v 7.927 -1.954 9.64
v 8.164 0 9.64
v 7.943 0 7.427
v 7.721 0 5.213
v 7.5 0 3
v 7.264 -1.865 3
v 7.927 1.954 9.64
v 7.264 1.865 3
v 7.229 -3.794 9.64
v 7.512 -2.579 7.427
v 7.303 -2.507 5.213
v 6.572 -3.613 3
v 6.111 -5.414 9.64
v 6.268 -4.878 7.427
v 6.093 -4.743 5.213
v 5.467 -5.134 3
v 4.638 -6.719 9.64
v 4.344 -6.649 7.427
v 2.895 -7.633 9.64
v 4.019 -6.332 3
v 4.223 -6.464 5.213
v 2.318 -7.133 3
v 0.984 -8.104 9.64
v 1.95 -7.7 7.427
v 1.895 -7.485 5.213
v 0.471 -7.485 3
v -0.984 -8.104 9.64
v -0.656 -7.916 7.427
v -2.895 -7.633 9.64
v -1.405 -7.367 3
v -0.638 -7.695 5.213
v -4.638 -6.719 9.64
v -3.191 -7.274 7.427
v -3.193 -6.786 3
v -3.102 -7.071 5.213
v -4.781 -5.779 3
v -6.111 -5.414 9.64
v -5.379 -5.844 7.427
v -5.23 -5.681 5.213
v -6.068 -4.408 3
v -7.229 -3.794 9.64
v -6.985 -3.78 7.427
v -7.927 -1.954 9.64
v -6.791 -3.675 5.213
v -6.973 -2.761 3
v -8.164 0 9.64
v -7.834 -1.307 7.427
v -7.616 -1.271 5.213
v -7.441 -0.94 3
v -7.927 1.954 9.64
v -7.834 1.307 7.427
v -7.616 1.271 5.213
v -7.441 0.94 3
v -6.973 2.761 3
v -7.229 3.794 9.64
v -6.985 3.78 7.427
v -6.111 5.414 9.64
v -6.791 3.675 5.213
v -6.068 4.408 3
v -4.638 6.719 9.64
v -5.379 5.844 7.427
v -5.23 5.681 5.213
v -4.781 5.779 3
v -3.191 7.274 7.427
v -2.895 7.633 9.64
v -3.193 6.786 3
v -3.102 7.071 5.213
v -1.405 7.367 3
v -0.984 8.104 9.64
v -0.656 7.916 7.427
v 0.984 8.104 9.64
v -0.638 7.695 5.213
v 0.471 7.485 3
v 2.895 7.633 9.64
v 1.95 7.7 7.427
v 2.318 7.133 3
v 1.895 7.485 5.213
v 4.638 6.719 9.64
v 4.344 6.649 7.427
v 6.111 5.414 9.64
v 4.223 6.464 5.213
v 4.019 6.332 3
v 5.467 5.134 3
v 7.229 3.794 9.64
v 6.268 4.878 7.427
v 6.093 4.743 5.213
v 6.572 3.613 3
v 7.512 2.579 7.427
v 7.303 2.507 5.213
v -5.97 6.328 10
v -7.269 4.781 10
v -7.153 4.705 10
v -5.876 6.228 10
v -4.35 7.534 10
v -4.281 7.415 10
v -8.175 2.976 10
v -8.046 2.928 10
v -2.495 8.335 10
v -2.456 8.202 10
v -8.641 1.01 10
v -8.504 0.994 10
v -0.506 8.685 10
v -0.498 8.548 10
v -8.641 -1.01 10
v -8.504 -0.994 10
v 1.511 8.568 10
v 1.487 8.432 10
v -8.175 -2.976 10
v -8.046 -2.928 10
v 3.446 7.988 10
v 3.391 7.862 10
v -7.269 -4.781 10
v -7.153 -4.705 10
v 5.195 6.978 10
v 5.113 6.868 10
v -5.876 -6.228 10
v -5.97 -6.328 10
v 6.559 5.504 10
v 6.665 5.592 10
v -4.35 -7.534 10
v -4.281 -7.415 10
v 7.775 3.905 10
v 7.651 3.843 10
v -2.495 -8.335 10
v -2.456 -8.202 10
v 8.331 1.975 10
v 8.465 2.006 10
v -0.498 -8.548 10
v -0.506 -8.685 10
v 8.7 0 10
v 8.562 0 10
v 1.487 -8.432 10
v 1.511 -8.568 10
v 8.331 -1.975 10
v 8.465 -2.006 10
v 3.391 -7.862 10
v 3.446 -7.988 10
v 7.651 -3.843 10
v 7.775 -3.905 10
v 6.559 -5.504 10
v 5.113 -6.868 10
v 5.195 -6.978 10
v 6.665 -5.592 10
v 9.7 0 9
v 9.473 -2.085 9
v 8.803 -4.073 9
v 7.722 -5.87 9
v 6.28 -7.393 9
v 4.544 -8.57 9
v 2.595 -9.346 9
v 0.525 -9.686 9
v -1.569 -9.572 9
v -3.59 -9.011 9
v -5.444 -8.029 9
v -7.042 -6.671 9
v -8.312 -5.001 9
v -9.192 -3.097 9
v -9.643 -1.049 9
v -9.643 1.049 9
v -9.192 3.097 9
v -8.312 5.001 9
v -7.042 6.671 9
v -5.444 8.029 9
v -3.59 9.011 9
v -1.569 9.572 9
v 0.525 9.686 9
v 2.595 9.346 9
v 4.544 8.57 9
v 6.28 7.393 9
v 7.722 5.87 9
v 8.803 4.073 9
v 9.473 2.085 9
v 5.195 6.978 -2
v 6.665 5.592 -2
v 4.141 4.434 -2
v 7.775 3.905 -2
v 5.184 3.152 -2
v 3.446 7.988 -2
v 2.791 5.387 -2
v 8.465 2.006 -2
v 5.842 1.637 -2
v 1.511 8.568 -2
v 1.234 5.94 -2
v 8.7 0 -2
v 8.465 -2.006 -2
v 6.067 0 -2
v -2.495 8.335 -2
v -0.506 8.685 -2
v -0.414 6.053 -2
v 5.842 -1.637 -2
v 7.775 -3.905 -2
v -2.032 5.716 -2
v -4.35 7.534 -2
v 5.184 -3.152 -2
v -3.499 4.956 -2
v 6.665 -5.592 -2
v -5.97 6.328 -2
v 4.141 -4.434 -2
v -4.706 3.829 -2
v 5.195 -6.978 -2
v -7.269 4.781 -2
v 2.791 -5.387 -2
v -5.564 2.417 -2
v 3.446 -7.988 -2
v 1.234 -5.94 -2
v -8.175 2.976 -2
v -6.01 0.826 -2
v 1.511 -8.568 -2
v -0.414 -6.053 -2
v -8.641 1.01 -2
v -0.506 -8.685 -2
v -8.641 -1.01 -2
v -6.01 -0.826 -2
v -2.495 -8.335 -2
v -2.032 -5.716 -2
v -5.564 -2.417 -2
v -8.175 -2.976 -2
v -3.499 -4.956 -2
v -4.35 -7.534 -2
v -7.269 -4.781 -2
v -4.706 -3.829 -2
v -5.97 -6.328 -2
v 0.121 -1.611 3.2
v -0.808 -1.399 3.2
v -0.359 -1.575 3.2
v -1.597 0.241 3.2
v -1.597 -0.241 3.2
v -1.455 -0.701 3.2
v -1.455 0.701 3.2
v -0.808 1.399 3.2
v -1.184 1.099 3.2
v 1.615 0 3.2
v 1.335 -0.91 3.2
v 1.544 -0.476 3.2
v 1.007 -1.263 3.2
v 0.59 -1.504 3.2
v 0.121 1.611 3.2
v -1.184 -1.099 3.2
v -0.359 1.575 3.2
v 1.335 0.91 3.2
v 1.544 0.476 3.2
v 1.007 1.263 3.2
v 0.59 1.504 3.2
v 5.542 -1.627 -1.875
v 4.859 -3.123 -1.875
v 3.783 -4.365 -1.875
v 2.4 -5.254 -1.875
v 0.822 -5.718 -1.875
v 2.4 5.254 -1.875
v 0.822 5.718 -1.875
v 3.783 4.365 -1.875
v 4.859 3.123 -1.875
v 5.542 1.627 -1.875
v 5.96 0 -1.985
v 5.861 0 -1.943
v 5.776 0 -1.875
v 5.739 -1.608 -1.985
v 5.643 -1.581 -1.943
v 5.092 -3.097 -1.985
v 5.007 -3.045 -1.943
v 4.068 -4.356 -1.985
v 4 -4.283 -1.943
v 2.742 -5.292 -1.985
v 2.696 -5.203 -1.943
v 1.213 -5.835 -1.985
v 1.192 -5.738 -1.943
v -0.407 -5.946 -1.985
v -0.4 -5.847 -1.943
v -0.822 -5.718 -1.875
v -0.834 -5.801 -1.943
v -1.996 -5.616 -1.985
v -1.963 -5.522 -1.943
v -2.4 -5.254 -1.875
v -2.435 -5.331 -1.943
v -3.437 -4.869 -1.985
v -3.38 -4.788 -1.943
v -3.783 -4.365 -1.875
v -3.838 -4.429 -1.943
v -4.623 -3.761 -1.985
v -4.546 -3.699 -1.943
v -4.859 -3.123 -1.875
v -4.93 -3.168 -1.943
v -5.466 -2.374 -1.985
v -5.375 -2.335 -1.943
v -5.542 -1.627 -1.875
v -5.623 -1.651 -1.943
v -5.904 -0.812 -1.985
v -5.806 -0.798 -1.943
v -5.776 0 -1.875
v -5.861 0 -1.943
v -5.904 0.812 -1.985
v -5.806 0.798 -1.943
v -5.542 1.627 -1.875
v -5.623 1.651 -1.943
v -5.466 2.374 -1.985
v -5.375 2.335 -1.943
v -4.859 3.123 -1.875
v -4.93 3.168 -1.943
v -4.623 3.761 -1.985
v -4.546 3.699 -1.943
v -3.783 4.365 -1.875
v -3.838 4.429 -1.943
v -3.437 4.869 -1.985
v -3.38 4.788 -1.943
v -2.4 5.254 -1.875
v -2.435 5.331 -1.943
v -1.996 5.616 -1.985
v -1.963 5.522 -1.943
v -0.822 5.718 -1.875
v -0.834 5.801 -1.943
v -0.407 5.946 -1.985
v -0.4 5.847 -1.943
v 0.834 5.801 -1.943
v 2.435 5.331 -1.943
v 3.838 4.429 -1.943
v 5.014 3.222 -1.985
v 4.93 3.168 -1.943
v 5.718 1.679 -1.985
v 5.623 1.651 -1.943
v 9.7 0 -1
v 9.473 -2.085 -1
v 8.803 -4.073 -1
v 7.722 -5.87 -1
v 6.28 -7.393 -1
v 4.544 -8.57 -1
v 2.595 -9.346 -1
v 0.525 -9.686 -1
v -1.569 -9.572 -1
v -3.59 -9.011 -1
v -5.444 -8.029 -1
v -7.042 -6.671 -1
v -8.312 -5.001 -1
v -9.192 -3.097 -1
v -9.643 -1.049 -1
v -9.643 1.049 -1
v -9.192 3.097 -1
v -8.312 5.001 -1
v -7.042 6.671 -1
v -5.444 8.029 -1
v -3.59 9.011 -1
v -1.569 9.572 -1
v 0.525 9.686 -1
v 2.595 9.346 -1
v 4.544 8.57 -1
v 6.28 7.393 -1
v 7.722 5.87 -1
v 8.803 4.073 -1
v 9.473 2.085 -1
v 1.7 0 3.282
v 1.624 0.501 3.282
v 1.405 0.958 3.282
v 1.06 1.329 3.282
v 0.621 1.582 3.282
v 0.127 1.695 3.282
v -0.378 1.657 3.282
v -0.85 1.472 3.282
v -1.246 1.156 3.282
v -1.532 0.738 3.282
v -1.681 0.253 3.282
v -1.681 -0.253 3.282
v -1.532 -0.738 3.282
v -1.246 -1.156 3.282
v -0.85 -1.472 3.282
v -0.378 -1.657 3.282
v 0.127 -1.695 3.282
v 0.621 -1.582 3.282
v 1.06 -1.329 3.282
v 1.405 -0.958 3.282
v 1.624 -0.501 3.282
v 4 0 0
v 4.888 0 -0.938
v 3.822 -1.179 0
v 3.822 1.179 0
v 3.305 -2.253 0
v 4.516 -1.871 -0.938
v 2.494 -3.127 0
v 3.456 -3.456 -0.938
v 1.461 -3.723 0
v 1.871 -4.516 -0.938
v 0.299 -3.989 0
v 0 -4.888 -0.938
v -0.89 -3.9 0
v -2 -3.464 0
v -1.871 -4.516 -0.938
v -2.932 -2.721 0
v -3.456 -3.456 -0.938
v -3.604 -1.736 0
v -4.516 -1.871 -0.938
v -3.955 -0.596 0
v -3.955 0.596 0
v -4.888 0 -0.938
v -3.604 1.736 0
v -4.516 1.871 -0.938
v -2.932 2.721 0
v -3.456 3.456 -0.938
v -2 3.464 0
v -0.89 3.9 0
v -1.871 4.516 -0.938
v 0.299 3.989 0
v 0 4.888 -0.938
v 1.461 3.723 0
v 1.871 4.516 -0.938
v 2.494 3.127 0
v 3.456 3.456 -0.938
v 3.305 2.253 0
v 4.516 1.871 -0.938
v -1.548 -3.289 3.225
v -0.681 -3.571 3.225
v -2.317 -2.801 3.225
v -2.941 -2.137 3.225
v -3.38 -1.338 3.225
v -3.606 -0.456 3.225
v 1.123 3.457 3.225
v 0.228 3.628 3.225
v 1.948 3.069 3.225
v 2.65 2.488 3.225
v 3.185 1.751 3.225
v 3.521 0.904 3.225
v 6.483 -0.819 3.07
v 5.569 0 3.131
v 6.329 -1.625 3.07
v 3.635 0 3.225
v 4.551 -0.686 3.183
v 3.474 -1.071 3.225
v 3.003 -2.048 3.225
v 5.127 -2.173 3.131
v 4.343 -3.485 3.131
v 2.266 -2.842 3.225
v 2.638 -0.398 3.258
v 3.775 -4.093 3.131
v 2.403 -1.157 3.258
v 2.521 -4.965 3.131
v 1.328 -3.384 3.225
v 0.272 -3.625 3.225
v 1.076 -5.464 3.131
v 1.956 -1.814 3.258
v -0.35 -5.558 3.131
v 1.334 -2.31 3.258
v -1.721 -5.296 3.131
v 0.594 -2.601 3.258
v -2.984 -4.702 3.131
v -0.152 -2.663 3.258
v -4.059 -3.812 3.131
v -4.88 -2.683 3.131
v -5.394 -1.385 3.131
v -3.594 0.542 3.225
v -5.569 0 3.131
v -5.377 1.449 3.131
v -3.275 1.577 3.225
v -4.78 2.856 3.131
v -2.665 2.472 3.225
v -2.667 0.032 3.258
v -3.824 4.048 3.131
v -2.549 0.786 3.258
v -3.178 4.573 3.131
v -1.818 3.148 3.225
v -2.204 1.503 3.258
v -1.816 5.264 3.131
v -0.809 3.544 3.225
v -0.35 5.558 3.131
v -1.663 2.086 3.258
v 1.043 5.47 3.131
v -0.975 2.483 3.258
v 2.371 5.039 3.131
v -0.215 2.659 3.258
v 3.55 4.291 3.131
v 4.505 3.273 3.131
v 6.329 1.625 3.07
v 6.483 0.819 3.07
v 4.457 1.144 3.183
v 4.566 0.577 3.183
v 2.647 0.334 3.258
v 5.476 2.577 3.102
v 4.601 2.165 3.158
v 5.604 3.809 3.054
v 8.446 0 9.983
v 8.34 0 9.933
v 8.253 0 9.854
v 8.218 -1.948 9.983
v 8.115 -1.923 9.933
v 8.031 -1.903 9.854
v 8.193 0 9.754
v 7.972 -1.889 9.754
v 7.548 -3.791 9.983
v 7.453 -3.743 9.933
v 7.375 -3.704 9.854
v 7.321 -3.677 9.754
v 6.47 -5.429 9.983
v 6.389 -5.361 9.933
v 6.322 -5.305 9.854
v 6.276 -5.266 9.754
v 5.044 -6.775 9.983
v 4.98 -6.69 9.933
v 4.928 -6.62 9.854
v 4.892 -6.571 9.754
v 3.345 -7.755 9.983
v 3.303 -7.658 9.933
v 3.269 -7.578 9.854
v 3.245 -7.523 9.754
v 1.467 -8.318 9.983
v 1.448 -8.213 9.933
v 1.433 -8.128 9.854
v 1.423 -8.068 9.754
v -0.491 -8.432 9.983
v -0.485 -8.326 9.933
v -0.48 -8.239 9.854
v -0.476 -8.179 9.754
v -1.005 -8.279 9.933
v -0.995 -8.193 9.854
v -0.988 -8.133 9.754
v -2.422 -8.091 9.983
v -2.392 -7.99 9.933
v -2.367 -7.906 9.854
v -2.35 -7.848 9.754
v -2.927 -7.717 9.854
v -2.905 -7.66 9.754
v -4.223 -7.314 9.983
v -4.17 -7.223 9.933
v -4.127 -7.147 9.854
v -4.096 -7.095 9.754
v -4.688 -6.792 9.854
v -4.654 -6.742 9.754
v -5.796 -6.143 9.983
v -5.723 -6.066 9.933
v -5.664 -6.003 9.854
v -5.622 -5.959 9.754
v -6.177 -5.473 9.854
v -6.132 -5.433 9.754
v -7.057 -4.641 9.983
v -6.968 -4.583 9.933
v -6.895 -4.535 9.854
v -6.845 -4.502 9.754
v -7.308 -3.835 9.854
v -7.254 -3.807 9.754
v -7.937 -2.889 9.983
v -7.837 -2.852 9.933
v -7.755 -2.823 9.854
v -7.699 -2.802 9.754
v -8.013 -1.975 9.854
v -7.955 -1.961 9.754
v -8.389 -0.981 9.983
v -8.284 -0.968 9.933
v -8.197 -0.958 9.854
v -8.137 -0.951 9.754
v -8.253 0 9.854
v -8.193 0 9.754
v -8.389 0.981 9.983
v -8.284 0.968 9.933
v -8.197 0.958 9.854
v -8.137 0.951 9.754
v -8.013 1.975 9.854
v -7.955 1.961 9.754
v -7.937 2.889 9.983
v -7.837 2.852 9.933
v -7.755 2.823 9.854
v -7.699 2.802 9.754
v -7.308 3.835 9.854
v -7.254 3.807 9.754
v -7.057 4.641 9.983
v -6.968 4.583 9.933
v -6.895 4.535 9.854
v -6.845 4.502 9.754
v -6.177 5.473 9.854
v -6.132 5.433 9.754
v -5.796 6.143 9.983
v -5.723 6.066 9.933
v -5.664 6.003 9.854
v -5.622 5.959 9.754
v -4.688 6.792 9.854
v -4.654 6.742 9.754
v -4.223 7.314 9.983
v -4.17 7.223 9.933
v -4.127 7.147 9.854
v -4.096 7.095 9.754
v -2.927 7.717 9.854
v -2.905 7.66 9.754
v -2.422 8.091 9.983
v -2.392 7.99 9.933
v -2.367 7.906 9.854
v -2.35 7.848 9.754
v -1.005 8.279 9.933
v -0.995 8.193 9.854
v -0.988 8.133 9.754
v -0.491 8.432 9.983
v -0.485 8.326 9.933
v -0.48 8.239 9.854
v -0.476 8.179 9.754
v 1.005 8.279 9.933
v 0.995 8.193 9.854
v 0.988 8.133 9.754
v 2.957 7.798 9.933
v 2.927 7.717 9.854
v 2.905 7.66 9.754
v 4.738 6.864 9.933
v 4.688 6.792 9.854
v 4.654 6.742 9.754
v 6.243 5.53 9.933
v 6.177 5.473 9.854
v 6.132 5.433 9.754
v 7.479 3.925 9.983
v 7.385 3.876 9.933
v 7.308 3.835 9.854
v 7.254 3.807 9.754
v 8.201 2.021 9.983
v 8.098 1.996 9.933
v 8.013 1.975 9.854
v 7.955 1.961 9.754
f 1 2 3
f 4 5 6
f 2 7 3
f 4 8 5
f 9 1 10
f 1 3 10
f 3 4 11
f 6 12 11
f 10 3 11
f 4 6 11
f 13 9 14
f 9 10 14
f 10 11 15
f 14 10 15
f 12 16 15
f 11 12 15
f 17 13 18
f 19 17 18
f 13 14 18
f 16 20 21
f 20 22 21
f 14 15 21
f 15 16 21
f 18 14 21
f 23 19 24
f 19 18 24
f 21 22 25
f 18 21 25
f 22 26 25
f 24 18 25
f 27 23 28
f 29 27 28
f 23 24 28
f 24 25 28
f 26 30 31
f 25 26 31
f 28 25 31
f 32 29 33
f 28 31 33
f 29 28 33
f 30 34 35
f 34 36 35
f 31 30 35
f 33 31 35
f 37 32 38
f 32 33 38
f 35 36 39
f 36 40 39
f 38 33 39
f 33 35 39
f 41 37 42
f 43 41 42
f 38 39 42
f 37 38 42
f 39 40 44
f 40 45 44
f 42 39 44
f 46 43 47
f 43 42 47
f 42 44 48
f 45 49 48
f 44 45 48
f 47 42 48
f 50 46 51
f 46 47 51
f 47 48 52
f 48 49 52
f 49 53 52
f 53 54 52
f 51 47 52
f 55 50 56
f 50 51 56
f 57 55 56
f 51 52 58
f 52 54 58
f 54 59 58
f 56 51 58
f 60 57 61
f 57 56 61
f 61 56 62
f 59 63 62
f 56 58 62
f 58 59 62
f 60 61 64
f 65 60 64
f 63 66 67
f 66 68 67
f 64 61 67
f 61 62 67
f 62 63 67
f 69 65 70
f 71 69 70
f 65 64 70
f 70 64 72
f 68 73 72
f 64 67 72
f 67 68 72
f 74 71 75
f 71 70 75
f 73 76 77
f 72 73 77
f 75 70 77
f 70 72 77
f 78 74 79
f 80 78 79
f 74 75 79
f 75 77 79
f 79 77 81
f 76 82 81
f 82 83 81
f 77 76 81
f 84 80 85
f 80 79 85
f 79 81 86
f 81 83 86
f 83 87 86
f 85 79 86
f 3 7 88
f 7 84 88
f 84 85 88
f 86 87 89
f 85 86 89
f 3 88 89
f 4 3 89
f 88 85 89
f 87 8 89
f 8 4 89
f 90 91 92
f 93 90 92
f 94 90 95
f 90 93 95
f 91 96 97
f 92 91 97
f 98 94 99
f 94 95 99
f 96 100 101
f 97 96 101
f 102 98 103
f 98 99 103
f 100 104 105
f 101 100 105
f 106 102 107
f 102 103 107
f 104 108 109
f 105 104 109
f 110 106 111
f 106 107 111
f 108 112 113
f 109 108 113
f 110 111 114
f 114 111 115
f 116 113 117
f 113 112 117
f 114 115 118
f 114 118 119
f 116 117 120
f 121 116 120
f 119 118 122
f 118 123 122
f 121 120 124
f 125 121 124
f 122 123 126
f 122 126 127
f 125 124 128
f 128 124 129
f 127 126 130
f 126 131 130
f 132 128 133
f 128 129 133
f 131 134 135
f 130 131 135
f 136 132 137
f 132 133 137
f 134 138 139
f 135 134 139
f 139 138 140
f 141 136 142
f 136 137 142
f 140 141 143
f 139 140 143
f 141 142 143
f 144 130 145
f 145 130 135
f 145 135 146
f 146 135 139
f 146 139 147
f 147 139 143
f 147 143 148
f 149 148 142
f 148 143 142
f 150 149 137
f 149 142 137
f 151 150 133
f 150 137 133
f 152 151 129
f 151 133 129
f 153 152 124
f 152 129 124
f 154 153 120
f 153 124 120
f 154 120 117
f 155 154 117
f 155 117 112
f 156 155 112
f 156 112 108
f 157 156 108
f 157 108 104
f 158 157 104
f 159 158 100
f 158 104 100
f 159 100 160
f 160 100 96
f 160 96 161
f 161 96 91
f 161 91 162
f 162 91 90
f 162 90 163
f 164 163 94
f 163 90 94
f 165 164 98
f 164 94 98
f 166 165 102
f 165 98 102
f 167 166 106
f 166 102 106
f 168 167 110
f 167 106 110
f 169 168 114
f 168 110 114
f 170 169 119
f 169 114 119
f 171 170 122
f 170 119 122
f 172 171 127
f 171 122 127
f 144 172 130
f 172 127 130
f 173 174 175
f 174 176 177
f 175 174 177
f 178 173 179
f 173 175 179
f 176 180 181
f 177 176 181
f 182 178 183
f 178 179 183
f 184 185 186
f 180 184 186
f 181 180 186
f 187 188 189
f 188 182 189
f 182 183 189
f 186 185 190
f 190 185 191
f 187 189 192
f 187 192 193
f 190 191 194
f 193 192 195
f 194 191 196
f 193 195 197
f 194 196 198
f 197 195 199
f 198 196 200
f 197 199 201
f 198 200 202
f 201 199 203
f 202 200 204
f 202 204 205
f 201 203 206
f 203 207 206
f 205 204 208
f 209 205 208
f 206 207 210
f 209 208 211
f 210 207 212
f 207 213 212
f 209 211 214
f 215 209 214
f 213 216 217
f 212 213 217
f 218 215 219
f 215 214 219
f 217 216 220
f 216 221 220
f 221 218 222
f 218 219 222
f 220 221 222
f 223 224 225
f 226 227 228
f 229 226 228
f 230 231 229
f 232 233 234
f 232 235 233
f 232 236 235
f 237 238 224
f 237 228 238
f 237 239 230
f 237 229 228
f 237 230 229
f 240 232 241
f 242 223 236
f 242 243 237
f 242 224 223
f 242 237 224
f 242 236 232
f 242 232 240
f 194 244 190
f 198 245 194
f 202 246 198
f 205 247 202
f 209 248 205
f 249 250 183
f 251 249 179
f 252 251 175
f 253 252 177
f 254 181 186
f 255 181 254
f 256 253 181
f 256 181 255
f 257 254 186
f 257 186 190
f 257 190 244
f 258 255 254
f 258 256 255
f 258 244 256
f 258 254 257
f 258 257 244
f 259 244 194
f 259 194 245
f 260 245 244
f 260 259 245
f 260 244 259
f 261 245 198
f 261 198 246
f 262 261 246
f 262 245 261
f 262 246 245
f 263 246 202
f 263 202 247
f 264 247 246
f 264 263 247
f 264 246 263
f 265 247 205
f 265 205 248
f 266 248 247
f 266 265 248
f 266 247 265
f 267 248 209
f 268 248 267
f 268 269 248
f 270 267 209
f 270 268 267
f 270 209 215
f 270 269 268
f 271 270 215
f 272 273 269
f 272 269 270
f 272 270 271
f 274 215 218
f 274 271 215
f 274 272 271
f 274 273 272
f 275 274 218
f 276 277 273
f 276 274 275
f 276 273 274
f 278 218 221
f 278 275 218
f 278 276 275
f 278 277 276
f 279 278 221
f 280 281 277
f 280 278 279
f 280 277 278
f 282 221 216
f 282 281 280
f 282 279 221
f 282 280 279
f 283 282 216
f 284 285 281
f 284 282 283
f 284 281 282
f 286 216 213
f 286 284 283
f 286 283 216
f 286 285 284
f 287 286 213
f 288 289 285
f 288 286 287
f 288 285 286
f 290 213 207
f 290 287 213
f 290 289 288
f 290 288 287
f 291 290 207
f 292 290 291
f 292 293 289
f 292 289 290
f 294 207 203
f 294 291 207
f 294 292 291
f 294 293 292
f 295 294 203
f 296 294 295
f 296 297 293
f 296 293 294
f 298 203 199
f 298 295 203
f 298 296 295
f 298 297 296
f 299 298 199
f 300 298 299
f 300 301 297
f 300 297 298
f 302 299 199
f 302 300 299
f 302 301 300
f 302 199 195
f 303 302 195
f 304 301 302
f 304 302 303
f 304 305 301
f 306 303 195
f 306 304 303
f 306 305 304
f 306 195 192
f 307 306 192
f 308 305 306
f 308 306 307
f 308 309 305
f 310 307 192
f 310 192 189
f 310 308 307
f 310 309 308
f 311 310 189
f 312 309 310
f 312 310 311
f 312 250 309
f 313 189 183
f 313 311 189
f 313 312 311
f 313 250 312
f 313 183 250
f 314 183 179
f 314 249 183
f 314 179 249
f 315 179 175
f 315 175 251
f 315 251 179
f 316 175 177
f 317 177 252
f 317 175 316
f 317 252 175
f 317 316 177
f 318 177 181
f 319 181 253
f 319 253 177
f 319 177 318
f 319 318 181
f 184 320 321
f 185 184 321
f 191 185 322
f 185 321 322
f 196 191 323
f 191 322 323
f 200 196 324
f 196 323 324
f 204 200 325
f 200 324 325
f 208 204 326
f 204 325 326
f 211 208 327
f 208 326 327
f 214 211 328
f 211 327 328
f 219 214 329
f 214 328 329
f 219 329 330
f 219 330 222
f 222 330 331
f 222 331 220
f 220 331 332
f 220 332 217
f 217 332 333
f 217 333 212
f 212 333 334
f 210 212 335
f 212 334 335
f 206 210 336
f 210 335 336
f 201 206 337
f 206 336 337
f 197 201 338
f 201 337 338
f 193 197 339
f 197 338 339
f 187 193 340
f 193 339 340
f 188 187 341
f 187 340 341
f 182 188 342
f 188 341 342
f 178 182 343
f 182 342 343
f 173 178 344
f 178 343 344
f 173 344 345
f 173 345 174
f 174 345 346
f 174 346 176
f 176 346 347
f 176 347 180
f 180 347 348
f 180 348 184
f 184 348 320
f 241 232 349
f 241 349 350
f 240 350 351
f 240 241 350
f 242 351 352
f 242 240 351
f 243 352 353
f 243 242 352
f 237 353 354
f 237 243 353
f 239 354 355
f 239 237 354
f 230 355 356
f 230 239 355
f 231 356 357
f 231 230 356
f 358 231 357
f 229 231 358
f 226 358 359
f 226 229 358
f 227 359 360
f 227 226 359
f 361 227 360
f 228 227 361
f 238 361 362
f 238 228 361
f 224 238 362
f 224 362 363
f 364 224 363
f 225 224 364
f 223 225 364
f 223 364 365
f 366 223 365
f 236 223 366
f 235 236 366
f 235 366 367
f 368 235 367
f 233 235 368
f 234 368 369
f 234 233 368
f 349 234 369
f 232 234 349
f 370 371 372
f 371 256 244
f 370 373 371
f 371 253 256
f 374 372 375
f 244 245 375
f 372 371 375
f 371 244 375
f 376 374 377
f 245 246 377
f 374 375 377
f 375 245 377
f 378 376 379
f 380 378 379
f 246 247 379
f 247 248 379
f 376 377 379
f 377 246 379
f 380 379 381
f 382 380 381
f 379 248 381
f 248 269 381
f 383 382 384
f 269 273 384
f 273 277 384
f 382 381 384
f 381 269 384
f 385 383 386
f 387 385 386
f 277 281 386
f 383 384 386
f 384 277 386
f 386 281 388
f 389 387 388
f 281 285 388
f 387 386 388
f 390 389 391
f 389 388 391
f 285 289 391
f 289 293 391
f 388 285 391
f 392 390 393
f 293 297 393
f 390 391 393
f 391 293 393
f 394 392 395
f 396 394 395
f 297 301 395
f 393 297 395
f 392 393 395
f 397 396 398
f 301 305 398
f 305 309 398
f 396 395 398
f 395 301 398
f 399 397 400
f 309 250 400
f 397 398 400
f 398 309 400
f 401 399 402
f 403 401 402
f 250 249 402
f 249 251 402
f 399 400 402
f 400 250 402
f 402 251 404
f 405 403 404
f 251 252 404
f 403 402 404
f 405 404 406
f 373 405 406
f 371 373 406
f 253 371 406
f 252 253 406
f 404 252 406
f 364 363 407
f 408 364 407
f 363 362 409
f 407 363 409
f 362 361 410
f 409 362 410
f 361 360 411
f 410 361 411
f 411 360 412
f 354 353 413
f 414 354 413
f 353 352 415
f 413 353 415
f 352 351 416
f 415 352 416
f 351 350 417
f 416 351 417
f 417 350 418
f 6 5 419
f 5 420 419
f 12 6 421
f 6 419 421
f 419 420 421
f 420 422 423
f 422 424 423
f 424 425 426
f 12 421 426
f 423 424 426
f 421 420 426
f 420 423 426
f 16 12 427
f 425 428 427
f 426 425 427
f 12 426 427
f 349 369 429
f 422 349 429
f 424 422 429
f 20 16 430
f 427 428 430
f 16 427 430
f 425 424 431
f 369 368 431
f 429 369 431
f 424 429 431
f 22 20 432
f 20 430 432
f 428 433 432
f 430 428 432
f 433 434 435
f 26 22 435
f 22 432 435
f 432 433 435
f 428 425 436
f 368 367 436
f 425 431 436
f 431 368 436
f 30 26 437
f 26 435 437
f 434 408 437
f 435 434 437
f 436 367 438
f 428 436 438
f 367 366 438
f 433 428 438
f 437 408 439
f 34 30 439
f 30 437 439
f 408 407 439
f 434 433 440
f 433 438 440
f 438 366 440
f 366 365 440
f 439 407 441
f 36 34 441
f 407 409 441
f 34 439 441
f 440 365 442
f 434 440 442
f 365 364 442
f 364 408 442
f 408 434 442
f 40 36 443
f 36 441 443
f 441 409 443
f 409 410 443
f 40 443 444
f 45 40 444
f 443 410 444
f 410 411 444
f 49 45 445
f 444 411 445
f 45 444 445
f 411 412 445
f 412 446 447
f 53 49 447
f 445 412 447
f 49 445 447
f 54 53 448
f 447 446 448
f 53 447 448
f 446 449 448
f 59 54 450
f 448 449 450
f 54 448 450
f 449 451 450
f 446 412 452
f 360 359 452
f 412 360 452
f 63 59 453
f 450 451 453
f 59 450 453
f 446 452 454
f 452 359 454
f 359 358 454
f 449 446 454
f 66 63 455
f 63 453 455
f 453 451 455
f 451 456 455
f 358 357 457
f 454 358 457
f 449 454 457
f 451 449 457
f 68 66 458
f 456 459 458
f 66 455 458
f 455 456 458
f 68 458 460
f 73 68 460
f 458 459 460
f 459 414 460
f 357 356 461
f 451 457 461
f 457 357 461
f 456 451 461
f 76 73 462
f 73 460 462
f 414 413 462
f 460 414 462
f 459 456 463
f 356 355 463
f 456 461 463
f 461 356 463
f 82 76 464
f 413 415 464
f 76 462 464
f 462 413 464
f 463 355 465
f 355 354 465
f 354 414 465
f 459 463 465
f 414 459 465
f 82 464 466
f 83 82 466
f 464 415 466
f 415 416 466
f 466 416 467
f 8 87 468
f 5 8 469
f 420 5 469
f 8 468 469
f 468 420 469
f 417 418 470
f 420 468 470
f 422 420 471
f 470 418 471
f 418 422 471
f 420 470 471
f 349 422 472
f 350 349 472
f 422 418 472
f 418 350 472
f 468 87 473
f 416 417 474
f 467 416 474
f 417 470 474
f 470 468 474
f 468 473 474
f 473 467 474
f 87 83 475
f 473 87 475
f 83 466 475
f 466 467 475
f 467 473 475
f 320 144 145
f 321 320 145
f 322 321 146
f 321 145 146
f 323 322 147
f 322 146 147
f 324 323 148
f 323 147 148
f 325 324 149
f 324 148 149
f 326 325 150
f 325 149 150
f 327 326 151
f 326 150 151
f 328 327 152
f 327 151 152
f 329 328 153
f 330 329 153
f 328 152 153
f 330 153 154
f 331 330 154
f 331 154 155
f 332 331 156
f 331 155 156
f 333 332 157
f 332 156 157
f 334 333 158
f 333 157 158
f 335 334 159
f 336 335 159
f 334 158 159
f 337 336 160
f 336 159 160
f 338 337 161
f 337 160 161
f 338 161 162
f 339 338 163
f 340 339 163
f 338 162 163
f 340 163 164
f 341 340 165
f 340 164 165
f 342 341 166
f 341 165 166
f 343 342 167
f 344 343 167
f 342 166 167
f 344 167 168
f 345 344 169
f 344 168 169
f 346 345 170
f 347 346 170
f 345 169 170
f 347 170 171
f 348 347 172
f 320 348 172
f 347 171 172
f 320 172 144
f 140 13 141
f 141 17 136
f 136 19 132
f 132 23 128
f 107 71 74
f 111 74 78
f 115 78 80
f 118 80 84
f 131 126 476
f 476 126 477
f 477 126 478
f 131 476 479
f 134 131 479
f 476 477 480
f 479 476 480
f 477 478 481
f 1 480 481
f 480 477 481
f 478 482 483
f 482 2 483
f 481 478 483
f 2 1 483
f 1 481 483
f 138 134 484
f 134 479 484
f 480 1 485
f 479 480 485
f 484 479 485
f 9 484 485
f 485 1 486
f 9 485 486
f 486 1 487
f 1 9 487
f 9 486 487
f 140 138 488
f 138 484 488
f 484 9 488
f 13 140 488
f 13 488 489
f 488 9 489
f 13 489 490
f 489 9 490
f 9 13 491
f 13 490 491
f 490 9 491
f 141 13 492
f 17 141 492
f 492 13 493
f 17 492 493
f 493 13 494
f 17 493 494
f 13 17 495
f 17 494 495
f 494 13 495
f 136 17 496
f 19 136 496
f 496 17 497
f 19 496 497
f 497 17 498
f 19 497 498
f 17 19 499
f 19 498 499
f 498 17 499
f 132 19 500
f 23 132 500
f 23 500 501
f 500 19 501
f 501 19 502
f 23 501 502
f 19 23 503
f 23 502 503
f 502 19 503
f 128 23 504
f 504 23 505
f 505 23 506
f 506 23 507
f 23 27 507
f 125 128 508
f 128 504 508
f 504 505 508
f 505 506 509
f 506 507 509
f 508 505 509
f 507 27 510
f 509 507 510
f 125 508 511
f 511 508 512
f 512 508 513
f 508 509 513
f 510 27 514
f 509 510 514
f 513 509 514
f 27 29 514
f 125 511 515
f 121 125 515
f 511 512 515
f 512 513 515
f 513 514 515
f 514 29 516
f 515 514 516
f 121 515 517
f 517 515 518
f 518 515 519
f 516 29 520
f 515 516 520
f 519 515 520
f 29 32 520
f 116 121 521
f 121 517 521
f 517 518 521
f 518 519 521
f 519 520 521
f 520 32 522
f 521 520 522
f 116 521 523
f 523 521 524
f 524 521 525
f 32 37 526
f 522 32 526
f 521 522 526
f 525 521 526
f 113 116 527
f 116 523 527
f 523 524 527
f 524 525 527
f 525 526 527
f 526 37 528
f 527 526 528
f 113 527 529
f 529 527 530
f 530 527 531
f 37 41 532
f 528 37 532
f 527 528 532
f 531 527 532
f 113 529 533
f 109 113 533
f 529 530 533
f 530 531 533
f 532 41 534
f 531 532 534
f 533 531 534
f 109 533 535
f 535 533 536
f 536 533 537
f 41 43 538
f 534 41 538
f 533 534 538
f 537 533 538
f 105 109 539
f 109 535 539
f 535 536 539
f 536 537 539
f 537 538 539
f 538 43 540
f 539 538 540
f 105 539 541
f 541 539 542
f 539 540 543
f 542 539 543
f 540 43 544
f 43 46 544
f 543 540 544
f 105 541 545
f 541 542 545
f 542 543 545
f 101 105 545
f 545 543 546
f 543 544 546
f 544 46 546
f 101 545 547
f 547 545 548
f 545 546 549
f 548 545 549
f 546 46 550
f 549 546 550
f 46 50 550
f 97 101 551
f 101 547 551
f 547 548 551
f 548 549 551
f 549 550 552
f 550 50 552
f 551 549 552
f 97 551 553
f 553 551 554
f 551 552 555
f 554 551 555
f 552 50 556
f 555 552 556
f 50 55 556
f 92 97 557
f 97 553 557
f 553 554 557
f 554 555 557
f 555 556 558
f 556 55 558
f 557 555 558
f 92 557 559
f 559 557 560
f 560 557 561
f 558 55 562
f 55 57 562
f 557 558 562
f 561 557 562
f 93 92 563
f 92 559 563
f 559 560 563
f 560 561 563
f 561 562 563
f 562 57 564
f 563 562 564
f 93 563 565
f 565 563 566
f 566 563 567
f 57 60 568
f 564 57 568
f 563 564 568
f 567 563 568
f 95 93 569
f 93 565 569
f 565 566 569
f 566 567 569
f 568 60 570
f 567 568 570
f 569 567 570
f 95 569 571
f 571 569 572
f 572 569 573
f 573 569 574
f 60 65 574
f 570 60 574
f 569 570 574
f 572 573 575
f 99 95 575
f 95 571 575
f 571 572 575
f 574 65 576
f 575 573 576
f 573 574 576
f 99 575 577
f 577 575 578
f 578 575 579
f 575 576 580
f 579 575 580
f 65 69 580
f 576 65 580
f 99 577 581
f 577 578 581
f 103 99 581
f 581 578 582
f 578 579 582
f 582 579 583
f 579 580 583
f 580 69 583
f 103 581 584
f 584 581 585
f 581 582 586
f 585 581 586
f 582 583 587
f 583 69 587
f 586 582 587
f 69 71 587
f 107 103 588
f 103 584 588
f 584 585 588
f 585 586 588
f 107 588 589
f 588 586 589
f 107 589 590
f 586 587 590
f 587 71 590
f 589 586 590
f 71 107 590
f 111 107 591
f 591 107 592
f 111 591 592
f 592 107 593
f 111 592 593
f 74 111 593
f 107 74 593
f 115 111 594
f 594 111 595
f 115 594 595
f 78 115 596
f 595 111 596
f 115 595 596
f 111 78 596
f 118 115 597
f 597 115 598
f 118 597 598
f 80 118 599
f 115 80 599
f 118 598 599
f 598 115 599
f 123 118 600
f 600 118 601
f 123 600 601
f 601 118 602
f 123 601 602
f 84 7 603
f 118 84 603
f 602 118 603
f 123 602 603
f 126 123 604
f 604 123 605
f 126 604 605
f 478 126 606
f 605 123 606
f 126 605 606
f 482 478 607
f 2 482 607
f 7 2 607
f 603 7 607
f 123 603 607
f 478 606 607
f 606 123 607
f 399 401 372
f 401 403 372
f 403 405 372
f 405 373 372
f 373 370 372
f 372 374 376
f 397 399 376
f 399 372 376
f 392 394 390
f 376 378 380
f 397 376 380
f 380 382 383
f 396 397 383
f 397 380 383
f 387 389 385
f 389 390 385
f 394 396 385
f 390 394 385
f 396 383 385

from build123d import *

# Parameters (mm, degrees)
CHAMFER_1_SIZE      = 1
FILLET_1_R          = 0.4
SKETCH_2_R          = 1.5
CUT_EXTRUDE_1_DEPTH = 6.8
CHAMFER_2_SIZE      = 0.2
CHAMFER_2_SIZE_2    = 0.196621941


with BuildPart() as part:
    # 스케치1 → 회전1 (revolve)
    with BuildSketch(Plane(origin=(0, 0, 0), x_dir=(1, 0, 0), z_dir=(0, 1, 0))):
        with BuildLine():
            Line((0, 0), (4, 0))
            Line((4, 0), (5.894700278586023, 2))
            Line((5.894700278586023, 2), (9.7, 2))
            Line((9.7, 2), (9.7, -10))
            Line((9.7, -10), (8.2, -9.999999999999998))
            Line((8.2, -9.999999999999998), (7.5, -2.999999999999999))
            ThreePointArc((7.5, -2.999999999999999), (3.75282938430565, -3.220734607641745), (0, -3.3))
            Line((0, -3.3), (0, -3))
            Line((0, -3), (0, 0))
        make_face()
    revolve(axis=Axis((0, 0, 3), (0, 0, -1)))

    # 모따기1
    chamfer_1_edges = [part.edges().sort_by_distance(p)[0] for p in [
        (-9.7, -1.19e-15, 10),
        (-9.7, -1.19e-15, -2),
    ]]
    chamfer(chamfer_1_edges, length=CHAMFER_1_SIZE)

    # 필렛1
    fillet_1_edges = [part.edges().sort_by_distance(p)[0] for p in [
        (-8.2, -1e-15, 9.999999999999998),
        (-5.894700278586023, -7.2e-16, -2),
    ]]
    fillet(fillet_1_edges, radius=FILLET_1_R)

    # 스케치2 → 컷-돌출1 (cut)
    with BuildSketch(Plane.XY.offset(10)):
        Circle(SKETCH_2_R)
    extrude(amount=-CUT_EXTRUDE_1_DEPTH, mode=Mode.SUBTRACT)

    # 모따기2
    # the kernel refuses this chamfer: 0.2, 0.196621941 mm, written as the material it takes off along each edge
    with BuildSketch(Plane(origin=(2.26883e-11, 1.9670789e-10, 3.2853073545034164), x_dir=(1.0, -1.3113829668845467e-10, 0), z_dir=(-1.3113829668845467e-10, -1.0, 0))) as chamfer_2_piece_1_section:
        with BuildLine():
            Line((1.499999999977312 + CHAMFER_2_SIZE * 0.999831893416, -CHAMFER_2_SIZE * 0.0183353458825), (1.5000000000226883, -CHAMFER_2_SIZE_2 * 1.00000000195))
            Line((1.5000000000226883, -CHAMFER_2_SIZE_2 * 1.00000000195), (1.499999999977312, 0))
            ThreePointArc((1.499999999977312, 0), (1.6028105859636501, -0.00183517420042278), (1.499999999977312 + CHAMFER_2_SIZE * 0.999831893416, -CHAMFER_2_SIZE * 0.0183353458825))
        make_face()
    chamfer_2_piece_1 = revolve(axis=Axis((2.26883e-11, 1.9670789e-10, 3.2853073545034164), (0, 0, 1)), mode=Mode.PRIVATE)
    chamfer_2_piece_1 = split(chamfer_2_piece_1, bisect_by=Plane(origin=(2.26883e-11, 1.9670789e-10, 3.2), z_dir=(0, 0, 1)), keep=Keep.TOP, mode=Mode.PRIVATE)
    add(chamfer_2_piece_1, mode=Mode.SUBTRACT)


solid = part.part
